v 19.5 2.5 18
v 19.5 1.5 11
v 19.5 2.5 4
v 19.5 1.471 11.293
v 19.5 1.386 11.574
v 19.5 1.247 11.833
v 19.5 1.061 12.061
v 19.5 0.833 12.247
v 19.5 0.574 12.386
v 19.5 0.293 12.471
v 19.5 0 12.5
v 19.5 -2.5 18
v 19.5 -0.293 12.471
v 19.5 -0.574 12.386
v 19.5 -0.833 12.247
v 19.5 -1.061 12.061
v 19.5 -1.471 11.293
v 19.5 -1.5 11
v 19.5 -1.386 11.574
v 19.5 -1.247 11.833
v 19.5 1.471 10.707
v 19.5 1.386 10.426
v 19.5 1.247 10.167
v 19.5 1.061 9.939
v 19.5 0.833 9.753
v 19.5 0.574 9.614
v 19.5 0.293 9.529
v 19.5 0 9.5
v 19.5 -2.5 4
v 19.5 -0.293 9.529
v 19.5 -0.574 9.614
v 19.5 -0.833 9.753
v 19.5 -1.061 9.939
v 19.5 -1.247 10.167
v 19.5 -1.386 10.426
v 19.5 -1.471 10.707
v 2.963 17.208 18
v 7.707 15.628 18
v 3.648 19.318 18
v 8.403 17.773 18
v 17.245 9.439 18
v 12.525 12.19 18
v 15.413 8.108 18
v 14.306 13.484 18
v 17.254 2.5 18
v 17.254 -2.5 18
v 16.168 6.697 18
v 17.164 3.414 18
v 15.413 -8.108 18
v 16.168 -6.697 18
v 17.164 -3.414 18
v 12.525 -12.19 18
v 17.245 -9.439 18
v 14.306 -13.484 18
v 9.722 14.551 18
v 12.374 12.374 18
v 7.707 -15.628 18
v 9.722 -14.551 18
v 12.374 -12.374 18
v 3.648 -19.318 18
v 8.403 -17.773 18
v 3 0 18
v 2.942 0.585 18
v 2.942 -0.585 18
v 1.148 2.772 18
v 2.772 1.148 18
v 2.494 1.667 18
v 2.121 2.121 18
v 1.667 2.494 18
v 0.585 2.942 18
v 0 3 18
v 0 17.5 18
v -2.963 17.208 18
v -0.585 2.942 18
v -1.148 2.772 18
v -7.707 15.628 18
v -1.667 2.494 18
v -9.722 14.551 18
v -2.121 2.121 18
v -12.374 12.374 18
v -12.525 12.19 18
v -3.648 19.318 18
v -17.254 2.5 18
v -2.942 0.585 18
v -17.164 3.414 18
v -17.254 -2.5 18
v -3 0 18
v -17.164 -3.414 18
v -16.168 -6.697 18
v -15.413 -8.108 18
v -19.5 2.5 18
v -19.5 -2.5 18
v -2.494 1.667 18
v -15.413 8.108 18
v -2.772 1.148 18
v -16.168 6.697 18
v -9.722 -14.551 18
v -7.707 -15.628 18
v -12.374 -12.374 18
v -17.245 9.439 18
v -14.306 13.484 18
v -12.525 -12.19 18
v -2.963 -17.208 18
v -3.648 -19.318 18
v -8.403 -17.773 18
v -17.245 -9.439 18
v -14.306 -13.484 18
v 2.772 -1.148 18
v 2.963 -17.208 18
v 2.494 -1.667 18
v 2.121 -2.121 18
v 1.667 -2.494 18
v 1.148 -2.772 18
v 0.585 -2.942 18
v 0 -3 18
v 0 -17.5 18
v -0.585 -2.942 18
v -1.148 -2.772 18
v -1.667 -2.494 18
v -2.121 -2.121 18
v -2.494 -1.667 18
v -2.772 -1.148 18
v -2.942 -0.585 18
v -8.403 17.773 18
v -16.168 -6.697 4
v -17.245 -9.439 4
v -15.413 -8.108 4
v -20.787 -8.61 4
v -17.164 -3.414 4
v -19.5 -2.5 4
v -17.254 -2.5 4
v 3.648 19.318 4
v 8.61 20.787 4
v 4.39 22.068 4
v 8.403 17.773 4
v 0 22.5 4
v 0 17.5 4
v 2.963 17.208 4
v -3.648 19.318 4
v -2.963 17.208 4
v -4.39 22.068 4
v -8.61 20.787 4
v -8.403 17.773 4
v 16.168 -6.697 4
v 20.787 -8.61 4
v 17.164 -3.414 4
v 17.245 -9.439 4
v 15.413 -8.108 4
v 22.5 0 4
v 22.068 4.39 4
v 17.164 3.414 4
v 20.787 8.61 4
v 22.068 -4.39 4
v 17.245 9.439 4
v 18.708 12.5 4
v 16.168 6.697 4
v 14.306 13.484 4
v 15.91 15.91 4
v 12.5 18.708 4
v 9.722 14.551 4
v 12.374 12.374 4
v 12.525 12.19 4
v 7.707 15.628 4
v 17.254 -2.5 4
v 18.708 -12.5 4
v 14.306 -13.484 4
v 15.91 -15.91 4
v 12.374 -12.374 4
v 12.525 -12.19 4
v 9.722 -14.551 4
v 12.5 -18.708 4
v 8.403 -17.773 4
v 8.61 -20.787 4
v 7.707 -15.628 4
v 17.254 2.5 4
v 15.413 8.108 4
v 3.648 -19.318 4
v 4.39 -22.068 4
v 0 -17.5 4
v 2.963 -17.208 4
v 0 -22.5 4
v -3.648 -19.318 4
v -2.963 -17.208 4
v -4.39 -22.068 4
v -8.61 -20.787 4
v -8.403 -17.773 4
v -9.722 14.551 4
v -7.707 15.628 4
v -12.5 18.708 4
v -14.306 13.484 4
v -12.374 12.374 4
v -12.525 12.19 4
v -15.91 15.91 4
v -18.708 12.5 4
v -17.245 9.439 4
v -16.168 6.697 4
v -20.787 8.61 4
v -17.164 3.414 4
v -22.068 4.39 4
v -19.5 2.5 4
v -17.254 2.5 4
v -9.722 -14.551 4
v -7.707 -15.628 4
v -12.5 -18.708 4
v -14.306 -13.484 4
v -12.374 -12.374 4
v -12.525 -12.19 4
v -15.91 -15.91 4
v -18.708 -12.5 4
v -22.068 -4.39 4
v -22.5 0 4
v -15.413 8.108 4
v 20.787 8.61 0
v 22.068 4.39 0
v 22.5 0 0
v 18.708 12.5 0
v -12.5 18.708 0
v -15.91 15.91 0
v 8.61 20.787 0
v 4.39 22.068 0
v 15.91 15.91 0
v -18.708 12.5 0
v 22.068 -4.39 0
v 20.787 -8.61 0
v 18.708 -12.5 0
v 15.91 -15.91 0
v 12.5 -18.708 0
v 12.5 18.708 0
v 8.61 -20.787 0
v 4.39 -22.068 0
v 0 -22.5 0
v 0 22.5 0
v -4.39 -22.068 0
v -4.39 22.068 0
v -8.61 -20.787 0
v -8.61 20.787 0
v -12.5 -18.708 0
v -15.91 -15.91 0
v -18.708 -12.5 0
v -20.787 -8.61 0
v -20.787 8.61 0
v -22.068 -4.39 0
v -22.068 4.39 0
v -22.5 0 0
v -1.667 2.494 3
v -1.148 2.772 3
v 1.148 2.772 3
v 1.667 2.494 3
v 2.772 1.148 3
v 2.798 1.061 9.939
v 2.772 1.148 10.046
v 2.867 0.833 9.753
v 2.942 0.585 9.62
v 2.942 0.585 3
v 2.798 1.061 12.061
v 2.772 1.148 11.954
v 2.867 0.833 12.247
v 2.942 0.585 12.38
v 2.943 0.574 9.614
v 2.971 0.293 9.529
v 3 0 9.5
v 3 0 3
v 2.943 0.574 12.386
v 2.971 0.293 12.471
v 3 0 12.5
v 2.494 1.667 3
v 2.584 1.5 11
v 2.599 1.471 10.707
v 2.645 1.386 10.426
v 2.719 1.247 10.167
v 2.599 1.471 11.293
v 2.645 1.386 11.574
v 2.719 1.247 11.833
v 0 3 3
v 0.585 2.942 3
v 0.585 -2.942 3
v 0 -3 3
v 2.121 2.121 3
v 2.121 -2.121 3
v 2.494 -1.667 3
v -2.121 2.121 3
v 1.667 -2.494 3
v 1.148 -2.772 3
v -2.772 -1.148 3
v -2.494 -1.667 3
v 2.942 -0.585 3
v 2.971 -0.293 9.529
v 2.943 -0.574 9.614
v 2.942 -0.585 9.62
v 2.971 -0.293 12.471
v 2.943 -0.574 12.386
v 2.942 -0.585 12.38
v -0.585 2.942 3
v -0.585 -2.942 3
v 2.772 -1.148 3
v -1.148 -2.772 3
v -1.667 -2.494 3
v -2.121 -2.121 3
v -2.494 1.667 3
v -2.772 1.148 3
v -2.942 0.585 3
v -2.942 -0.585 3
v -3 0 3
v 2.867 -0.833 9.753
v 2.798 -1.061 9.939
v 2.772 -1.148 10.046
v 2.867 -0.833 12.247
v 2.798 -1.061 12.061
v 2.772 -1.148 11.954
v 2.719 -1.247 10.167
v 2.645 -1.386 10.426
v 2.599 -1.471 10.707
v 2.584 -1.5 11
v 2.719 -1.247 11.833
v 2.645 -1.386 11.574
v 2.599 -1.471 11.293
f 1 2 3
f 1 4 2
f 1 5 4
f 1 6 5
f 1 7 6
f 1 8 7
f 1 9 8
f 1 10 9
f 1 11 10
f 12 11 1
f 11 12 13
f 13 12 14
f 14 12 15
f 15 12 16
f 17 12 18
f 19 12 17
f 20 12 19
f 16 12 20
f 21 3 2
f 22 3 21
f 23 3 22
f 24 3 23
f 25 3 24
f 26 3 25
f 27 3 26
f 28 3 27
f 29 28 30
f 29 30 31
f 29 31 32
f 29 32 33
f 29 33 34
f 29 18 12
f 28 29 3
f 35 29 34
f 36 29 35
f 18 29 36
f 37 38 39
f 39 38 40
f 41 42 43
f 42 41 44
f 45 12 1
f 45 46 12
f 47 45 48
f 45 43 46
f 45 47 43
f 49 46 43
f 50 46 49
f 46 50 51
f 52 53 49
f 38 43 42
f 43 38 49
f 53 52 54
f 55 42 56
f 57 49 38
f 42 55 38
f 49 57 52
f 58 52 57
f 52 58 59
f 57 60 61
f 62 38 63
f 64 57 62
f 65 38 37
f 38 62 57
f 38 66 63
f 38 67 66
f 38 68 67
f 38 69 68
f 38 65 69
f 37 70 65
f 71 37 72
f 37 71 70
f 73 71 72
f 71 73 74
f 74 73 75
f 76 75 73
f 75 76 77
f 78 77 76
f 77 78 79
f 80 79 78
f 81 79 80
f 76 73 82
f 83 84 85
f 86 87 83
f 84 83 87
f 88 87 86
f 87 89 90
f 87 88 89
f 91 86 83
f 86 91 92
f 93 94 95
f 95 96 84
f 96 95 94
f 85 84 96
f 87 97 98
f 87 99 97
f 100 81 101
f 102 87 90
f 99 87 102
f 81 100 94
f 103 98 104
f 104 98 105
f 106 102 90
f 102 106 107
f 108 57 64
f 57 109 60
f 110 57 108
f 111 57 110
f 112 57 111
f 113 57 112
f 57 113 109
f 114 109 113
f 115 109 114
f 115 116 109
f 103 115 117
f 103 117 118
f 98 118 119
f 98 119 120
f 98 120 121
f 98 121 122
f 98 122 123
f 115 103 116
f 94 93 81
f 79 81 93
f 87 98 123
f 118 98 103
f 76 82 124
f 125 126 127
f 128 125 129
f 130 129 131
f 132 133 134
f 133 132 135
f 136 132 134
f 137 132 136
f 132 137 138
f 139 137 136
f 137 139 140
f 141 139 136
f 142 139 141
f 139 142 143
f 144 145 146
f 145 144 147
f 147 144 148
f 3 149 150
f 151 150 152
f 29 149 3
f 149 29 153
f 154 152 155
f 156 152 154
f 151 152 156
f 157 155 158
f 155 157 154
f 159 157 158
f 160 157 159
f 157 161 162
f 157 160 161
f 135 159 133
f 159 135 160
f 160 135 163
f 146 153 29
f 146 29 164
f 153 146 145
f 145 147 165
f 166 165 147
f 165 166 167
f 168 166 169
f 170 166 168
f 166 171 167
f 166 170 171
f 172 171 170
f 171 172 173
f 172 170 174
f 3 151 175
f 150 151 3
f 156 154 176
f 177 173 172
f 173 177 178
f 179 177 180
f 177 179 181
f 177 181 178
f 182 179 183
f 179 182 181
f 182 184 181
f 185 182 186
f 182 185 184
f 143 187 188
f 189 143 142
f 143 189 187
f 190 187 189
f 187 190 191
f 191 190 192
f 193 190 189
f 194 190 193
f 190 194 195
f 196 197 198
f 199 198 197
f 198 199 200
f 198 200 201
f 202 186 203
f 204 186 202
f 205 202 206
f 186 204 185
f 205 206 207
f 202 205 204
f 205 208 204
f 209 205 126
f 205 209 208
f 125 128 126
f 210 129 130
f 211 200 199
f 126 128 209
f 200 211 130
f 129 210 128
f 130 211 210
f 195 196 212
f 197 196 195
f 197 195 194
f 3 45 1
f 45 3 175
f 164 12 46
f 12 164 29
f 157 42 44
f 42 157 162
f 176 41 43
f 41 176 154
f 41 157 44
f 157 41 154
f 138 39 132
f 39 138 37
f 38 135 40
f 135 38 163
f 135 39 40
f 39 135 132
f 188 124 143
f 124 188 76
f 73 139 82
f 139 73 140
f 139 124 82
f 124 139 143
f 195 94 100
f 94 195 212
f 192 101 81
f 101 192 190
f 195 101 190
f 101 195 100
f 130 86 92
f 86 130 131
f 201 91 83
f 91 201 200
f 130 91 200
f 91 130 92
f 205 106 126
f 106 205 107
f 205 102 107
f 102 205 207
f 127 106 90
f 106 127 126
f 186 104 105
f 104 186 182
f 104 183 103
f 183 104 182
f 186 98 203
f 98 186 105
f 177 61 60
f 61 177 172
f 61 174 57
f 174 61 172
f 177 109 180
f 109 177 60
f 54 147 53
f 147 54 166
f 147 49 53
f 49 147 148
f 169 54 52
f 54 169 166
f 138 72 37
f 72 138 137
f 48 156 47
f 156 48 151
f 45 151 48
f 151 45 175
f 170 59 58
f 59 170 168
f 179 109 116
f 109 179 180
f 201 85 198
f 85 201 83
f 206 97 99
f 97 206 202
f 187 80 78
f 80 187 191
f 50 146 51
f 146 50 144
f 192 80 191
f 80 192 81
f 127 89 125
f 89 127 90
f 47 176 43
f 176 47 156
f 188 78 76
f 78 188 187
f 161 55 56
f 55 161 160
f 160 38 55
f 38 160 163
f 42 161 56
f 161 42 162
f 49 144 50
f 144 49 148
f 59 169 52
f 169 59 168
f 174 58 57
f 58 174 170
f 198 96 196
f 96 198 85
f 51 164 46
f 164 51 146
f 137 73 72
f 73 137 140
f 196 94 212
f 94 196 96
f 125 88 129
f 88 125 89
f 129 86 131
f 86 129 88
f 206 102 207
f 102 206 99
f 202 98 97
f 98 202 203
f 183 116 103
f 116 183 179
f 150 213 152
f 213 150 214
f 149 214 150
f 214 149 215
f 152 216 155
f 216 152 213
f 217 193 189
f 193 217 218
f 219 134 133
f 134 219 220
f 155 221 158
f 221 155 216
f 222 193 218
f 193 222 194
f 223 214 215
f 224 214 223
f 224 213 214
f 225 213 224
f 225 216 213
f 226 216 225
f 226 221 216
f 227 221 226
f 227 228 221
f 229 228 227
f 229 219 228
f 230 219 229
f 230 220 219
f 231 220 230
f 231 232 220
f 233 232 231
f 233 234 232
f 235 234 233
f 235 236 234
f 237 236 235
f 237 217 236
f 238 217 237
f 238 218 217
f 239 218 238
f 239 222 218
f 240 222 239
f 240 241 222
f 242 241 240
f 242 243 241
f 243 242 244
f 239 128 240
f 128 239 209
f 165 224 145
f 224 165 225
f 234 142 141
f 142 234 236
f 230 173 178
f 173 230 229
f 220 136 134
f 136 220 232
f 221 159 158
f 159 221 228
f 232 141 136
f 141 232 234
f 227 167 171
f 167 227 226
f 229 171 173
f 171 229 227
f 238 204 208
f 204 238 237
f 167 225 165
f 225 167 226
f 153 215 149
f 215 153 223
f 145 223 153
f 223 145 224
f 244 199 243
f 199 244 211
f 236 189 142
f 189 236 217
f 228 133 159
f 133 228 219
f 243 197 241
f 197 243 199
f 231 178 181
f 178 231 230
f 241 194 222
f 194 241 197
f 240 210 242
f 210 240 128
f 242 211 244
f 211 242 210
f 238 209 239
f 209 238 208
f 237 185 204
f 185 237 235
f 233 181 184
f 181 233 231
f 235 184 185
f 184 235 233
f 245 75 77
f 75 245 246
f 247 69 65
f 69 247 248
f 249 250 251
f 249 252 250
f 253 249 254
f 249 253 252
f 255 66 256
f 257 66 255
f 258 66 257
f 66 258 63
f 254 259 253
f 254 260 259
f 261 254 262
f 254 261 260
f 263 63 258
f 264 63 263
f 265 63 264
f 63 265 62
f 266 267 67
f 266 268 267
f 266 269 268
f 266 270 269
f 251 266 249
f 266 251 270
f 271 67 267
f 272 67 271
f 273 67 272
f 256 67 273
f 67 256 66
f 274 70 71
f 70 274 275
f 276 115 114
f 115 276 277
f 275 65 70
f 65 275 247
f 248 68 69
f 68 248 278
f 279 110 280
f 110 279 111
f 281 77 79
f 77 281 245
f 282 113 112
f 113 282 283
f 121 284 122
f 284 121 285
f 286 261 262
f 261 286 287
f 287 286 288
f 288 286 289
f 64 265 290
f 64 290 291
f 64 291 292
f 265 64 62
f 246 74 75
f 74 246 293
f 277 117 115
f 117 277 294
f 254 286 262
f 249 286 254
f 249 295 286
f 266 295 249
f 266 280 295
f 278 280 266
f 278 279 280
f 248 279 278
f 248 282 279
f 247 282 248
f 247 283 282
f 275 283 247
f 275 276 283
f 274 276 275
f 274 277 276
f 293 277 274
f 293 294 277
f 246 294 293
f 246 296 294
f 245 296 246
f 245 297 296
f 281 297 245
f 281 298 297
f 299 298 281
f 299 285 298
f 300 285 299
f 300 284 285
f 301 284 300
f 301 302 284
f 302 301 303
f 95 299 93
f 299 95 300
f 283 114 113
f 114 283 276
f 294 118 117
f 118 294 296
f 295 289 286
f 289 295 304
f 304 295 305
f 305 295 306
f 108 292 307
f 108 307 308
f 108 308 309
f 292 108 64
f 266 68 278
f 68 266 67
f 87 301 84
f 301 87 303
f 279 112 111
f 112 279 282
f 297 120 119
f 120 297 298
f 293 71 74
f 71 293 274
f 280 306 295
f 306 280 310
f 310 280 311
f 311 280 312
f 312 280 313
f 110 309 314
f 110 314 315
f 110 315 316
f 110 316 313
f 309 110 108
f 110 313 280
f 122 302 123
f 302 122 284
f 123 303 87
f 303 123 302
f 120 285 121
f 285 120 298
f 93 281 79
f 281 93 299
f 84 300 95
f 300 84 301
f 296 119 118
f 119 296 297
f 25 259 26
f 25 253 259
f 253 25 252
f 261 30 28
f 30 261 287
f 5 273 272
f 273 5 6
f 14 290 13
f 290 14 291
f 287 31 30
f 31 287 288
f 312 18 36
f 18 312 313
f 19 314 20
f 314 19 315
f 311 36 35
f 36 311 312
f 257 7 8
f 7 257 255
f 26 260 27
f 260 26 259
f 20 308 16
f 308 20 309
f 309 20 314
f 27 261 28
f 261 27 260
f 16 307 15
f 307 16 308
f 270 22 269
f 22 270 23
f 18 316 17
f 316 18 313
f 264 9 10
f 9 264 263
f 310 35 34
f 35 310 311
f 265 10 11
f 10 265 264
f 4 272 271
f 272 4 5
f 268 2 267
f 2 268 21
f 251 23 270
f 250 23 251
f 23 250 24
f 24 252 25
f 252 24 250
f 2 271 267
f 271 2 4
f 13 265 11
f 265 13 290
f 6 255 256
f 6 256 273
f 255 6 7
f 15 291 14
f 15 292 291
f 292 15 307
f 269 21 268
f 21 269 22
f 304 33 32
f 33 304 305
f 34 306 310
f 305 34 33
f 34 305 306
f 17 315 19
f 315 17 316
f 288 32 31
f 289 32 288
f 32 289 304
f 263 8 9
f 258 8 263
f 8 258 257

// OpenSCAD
$fn = 32;

// ----------------------------------------------------------------------
// Control knob: skirt knob with grip ribs
// ----------------------------------------------------------------------

// --- parameters (mm) ---
skirt_d = 45;             // skirt diameter
skirt_t = 4;              // skirt thickness
rib_w = 5;                // grip rib width
rib_out = 3;              // grip rib radial protrusion
n_ribs = 10;              // number of grip ribs
knob_d = 35;              // knob body diameter
knob_h = 14;              // knob body height
bore_d = 6;               // shaft bore diameter
set_d = 3;                // set screw bore diameter

rib_step = 360 / n_ribs;  // rib angular step
total_h = skirt_t + knob_h;  // overall height

difference() {
  union() {
    translate([0, 0, skirt_t]) cylinder(h = knob_h, d = knob_d);
    cylinder(h = skirt_t, d = skirt_d);
    for (i = [0 : n_ribs - 1])
      rotate([0, 0, i * rib_step])
        translate([knob_d / 2 - 1, -rib_w / 2, skirt_t])
          cube([rib_out, rib_w, knob_h]);
  }
  translate([0, 0, skirt_t - 1]) cylinder(h = knob_h + 2, d = bore_d);
  translate([-1, 0, skirt_t + knob_h / 2]) rotate([0, 90, 0])
    cylinder(h = knob_d / 2 + bore_d / 2 + 2, d = set_d);
}
